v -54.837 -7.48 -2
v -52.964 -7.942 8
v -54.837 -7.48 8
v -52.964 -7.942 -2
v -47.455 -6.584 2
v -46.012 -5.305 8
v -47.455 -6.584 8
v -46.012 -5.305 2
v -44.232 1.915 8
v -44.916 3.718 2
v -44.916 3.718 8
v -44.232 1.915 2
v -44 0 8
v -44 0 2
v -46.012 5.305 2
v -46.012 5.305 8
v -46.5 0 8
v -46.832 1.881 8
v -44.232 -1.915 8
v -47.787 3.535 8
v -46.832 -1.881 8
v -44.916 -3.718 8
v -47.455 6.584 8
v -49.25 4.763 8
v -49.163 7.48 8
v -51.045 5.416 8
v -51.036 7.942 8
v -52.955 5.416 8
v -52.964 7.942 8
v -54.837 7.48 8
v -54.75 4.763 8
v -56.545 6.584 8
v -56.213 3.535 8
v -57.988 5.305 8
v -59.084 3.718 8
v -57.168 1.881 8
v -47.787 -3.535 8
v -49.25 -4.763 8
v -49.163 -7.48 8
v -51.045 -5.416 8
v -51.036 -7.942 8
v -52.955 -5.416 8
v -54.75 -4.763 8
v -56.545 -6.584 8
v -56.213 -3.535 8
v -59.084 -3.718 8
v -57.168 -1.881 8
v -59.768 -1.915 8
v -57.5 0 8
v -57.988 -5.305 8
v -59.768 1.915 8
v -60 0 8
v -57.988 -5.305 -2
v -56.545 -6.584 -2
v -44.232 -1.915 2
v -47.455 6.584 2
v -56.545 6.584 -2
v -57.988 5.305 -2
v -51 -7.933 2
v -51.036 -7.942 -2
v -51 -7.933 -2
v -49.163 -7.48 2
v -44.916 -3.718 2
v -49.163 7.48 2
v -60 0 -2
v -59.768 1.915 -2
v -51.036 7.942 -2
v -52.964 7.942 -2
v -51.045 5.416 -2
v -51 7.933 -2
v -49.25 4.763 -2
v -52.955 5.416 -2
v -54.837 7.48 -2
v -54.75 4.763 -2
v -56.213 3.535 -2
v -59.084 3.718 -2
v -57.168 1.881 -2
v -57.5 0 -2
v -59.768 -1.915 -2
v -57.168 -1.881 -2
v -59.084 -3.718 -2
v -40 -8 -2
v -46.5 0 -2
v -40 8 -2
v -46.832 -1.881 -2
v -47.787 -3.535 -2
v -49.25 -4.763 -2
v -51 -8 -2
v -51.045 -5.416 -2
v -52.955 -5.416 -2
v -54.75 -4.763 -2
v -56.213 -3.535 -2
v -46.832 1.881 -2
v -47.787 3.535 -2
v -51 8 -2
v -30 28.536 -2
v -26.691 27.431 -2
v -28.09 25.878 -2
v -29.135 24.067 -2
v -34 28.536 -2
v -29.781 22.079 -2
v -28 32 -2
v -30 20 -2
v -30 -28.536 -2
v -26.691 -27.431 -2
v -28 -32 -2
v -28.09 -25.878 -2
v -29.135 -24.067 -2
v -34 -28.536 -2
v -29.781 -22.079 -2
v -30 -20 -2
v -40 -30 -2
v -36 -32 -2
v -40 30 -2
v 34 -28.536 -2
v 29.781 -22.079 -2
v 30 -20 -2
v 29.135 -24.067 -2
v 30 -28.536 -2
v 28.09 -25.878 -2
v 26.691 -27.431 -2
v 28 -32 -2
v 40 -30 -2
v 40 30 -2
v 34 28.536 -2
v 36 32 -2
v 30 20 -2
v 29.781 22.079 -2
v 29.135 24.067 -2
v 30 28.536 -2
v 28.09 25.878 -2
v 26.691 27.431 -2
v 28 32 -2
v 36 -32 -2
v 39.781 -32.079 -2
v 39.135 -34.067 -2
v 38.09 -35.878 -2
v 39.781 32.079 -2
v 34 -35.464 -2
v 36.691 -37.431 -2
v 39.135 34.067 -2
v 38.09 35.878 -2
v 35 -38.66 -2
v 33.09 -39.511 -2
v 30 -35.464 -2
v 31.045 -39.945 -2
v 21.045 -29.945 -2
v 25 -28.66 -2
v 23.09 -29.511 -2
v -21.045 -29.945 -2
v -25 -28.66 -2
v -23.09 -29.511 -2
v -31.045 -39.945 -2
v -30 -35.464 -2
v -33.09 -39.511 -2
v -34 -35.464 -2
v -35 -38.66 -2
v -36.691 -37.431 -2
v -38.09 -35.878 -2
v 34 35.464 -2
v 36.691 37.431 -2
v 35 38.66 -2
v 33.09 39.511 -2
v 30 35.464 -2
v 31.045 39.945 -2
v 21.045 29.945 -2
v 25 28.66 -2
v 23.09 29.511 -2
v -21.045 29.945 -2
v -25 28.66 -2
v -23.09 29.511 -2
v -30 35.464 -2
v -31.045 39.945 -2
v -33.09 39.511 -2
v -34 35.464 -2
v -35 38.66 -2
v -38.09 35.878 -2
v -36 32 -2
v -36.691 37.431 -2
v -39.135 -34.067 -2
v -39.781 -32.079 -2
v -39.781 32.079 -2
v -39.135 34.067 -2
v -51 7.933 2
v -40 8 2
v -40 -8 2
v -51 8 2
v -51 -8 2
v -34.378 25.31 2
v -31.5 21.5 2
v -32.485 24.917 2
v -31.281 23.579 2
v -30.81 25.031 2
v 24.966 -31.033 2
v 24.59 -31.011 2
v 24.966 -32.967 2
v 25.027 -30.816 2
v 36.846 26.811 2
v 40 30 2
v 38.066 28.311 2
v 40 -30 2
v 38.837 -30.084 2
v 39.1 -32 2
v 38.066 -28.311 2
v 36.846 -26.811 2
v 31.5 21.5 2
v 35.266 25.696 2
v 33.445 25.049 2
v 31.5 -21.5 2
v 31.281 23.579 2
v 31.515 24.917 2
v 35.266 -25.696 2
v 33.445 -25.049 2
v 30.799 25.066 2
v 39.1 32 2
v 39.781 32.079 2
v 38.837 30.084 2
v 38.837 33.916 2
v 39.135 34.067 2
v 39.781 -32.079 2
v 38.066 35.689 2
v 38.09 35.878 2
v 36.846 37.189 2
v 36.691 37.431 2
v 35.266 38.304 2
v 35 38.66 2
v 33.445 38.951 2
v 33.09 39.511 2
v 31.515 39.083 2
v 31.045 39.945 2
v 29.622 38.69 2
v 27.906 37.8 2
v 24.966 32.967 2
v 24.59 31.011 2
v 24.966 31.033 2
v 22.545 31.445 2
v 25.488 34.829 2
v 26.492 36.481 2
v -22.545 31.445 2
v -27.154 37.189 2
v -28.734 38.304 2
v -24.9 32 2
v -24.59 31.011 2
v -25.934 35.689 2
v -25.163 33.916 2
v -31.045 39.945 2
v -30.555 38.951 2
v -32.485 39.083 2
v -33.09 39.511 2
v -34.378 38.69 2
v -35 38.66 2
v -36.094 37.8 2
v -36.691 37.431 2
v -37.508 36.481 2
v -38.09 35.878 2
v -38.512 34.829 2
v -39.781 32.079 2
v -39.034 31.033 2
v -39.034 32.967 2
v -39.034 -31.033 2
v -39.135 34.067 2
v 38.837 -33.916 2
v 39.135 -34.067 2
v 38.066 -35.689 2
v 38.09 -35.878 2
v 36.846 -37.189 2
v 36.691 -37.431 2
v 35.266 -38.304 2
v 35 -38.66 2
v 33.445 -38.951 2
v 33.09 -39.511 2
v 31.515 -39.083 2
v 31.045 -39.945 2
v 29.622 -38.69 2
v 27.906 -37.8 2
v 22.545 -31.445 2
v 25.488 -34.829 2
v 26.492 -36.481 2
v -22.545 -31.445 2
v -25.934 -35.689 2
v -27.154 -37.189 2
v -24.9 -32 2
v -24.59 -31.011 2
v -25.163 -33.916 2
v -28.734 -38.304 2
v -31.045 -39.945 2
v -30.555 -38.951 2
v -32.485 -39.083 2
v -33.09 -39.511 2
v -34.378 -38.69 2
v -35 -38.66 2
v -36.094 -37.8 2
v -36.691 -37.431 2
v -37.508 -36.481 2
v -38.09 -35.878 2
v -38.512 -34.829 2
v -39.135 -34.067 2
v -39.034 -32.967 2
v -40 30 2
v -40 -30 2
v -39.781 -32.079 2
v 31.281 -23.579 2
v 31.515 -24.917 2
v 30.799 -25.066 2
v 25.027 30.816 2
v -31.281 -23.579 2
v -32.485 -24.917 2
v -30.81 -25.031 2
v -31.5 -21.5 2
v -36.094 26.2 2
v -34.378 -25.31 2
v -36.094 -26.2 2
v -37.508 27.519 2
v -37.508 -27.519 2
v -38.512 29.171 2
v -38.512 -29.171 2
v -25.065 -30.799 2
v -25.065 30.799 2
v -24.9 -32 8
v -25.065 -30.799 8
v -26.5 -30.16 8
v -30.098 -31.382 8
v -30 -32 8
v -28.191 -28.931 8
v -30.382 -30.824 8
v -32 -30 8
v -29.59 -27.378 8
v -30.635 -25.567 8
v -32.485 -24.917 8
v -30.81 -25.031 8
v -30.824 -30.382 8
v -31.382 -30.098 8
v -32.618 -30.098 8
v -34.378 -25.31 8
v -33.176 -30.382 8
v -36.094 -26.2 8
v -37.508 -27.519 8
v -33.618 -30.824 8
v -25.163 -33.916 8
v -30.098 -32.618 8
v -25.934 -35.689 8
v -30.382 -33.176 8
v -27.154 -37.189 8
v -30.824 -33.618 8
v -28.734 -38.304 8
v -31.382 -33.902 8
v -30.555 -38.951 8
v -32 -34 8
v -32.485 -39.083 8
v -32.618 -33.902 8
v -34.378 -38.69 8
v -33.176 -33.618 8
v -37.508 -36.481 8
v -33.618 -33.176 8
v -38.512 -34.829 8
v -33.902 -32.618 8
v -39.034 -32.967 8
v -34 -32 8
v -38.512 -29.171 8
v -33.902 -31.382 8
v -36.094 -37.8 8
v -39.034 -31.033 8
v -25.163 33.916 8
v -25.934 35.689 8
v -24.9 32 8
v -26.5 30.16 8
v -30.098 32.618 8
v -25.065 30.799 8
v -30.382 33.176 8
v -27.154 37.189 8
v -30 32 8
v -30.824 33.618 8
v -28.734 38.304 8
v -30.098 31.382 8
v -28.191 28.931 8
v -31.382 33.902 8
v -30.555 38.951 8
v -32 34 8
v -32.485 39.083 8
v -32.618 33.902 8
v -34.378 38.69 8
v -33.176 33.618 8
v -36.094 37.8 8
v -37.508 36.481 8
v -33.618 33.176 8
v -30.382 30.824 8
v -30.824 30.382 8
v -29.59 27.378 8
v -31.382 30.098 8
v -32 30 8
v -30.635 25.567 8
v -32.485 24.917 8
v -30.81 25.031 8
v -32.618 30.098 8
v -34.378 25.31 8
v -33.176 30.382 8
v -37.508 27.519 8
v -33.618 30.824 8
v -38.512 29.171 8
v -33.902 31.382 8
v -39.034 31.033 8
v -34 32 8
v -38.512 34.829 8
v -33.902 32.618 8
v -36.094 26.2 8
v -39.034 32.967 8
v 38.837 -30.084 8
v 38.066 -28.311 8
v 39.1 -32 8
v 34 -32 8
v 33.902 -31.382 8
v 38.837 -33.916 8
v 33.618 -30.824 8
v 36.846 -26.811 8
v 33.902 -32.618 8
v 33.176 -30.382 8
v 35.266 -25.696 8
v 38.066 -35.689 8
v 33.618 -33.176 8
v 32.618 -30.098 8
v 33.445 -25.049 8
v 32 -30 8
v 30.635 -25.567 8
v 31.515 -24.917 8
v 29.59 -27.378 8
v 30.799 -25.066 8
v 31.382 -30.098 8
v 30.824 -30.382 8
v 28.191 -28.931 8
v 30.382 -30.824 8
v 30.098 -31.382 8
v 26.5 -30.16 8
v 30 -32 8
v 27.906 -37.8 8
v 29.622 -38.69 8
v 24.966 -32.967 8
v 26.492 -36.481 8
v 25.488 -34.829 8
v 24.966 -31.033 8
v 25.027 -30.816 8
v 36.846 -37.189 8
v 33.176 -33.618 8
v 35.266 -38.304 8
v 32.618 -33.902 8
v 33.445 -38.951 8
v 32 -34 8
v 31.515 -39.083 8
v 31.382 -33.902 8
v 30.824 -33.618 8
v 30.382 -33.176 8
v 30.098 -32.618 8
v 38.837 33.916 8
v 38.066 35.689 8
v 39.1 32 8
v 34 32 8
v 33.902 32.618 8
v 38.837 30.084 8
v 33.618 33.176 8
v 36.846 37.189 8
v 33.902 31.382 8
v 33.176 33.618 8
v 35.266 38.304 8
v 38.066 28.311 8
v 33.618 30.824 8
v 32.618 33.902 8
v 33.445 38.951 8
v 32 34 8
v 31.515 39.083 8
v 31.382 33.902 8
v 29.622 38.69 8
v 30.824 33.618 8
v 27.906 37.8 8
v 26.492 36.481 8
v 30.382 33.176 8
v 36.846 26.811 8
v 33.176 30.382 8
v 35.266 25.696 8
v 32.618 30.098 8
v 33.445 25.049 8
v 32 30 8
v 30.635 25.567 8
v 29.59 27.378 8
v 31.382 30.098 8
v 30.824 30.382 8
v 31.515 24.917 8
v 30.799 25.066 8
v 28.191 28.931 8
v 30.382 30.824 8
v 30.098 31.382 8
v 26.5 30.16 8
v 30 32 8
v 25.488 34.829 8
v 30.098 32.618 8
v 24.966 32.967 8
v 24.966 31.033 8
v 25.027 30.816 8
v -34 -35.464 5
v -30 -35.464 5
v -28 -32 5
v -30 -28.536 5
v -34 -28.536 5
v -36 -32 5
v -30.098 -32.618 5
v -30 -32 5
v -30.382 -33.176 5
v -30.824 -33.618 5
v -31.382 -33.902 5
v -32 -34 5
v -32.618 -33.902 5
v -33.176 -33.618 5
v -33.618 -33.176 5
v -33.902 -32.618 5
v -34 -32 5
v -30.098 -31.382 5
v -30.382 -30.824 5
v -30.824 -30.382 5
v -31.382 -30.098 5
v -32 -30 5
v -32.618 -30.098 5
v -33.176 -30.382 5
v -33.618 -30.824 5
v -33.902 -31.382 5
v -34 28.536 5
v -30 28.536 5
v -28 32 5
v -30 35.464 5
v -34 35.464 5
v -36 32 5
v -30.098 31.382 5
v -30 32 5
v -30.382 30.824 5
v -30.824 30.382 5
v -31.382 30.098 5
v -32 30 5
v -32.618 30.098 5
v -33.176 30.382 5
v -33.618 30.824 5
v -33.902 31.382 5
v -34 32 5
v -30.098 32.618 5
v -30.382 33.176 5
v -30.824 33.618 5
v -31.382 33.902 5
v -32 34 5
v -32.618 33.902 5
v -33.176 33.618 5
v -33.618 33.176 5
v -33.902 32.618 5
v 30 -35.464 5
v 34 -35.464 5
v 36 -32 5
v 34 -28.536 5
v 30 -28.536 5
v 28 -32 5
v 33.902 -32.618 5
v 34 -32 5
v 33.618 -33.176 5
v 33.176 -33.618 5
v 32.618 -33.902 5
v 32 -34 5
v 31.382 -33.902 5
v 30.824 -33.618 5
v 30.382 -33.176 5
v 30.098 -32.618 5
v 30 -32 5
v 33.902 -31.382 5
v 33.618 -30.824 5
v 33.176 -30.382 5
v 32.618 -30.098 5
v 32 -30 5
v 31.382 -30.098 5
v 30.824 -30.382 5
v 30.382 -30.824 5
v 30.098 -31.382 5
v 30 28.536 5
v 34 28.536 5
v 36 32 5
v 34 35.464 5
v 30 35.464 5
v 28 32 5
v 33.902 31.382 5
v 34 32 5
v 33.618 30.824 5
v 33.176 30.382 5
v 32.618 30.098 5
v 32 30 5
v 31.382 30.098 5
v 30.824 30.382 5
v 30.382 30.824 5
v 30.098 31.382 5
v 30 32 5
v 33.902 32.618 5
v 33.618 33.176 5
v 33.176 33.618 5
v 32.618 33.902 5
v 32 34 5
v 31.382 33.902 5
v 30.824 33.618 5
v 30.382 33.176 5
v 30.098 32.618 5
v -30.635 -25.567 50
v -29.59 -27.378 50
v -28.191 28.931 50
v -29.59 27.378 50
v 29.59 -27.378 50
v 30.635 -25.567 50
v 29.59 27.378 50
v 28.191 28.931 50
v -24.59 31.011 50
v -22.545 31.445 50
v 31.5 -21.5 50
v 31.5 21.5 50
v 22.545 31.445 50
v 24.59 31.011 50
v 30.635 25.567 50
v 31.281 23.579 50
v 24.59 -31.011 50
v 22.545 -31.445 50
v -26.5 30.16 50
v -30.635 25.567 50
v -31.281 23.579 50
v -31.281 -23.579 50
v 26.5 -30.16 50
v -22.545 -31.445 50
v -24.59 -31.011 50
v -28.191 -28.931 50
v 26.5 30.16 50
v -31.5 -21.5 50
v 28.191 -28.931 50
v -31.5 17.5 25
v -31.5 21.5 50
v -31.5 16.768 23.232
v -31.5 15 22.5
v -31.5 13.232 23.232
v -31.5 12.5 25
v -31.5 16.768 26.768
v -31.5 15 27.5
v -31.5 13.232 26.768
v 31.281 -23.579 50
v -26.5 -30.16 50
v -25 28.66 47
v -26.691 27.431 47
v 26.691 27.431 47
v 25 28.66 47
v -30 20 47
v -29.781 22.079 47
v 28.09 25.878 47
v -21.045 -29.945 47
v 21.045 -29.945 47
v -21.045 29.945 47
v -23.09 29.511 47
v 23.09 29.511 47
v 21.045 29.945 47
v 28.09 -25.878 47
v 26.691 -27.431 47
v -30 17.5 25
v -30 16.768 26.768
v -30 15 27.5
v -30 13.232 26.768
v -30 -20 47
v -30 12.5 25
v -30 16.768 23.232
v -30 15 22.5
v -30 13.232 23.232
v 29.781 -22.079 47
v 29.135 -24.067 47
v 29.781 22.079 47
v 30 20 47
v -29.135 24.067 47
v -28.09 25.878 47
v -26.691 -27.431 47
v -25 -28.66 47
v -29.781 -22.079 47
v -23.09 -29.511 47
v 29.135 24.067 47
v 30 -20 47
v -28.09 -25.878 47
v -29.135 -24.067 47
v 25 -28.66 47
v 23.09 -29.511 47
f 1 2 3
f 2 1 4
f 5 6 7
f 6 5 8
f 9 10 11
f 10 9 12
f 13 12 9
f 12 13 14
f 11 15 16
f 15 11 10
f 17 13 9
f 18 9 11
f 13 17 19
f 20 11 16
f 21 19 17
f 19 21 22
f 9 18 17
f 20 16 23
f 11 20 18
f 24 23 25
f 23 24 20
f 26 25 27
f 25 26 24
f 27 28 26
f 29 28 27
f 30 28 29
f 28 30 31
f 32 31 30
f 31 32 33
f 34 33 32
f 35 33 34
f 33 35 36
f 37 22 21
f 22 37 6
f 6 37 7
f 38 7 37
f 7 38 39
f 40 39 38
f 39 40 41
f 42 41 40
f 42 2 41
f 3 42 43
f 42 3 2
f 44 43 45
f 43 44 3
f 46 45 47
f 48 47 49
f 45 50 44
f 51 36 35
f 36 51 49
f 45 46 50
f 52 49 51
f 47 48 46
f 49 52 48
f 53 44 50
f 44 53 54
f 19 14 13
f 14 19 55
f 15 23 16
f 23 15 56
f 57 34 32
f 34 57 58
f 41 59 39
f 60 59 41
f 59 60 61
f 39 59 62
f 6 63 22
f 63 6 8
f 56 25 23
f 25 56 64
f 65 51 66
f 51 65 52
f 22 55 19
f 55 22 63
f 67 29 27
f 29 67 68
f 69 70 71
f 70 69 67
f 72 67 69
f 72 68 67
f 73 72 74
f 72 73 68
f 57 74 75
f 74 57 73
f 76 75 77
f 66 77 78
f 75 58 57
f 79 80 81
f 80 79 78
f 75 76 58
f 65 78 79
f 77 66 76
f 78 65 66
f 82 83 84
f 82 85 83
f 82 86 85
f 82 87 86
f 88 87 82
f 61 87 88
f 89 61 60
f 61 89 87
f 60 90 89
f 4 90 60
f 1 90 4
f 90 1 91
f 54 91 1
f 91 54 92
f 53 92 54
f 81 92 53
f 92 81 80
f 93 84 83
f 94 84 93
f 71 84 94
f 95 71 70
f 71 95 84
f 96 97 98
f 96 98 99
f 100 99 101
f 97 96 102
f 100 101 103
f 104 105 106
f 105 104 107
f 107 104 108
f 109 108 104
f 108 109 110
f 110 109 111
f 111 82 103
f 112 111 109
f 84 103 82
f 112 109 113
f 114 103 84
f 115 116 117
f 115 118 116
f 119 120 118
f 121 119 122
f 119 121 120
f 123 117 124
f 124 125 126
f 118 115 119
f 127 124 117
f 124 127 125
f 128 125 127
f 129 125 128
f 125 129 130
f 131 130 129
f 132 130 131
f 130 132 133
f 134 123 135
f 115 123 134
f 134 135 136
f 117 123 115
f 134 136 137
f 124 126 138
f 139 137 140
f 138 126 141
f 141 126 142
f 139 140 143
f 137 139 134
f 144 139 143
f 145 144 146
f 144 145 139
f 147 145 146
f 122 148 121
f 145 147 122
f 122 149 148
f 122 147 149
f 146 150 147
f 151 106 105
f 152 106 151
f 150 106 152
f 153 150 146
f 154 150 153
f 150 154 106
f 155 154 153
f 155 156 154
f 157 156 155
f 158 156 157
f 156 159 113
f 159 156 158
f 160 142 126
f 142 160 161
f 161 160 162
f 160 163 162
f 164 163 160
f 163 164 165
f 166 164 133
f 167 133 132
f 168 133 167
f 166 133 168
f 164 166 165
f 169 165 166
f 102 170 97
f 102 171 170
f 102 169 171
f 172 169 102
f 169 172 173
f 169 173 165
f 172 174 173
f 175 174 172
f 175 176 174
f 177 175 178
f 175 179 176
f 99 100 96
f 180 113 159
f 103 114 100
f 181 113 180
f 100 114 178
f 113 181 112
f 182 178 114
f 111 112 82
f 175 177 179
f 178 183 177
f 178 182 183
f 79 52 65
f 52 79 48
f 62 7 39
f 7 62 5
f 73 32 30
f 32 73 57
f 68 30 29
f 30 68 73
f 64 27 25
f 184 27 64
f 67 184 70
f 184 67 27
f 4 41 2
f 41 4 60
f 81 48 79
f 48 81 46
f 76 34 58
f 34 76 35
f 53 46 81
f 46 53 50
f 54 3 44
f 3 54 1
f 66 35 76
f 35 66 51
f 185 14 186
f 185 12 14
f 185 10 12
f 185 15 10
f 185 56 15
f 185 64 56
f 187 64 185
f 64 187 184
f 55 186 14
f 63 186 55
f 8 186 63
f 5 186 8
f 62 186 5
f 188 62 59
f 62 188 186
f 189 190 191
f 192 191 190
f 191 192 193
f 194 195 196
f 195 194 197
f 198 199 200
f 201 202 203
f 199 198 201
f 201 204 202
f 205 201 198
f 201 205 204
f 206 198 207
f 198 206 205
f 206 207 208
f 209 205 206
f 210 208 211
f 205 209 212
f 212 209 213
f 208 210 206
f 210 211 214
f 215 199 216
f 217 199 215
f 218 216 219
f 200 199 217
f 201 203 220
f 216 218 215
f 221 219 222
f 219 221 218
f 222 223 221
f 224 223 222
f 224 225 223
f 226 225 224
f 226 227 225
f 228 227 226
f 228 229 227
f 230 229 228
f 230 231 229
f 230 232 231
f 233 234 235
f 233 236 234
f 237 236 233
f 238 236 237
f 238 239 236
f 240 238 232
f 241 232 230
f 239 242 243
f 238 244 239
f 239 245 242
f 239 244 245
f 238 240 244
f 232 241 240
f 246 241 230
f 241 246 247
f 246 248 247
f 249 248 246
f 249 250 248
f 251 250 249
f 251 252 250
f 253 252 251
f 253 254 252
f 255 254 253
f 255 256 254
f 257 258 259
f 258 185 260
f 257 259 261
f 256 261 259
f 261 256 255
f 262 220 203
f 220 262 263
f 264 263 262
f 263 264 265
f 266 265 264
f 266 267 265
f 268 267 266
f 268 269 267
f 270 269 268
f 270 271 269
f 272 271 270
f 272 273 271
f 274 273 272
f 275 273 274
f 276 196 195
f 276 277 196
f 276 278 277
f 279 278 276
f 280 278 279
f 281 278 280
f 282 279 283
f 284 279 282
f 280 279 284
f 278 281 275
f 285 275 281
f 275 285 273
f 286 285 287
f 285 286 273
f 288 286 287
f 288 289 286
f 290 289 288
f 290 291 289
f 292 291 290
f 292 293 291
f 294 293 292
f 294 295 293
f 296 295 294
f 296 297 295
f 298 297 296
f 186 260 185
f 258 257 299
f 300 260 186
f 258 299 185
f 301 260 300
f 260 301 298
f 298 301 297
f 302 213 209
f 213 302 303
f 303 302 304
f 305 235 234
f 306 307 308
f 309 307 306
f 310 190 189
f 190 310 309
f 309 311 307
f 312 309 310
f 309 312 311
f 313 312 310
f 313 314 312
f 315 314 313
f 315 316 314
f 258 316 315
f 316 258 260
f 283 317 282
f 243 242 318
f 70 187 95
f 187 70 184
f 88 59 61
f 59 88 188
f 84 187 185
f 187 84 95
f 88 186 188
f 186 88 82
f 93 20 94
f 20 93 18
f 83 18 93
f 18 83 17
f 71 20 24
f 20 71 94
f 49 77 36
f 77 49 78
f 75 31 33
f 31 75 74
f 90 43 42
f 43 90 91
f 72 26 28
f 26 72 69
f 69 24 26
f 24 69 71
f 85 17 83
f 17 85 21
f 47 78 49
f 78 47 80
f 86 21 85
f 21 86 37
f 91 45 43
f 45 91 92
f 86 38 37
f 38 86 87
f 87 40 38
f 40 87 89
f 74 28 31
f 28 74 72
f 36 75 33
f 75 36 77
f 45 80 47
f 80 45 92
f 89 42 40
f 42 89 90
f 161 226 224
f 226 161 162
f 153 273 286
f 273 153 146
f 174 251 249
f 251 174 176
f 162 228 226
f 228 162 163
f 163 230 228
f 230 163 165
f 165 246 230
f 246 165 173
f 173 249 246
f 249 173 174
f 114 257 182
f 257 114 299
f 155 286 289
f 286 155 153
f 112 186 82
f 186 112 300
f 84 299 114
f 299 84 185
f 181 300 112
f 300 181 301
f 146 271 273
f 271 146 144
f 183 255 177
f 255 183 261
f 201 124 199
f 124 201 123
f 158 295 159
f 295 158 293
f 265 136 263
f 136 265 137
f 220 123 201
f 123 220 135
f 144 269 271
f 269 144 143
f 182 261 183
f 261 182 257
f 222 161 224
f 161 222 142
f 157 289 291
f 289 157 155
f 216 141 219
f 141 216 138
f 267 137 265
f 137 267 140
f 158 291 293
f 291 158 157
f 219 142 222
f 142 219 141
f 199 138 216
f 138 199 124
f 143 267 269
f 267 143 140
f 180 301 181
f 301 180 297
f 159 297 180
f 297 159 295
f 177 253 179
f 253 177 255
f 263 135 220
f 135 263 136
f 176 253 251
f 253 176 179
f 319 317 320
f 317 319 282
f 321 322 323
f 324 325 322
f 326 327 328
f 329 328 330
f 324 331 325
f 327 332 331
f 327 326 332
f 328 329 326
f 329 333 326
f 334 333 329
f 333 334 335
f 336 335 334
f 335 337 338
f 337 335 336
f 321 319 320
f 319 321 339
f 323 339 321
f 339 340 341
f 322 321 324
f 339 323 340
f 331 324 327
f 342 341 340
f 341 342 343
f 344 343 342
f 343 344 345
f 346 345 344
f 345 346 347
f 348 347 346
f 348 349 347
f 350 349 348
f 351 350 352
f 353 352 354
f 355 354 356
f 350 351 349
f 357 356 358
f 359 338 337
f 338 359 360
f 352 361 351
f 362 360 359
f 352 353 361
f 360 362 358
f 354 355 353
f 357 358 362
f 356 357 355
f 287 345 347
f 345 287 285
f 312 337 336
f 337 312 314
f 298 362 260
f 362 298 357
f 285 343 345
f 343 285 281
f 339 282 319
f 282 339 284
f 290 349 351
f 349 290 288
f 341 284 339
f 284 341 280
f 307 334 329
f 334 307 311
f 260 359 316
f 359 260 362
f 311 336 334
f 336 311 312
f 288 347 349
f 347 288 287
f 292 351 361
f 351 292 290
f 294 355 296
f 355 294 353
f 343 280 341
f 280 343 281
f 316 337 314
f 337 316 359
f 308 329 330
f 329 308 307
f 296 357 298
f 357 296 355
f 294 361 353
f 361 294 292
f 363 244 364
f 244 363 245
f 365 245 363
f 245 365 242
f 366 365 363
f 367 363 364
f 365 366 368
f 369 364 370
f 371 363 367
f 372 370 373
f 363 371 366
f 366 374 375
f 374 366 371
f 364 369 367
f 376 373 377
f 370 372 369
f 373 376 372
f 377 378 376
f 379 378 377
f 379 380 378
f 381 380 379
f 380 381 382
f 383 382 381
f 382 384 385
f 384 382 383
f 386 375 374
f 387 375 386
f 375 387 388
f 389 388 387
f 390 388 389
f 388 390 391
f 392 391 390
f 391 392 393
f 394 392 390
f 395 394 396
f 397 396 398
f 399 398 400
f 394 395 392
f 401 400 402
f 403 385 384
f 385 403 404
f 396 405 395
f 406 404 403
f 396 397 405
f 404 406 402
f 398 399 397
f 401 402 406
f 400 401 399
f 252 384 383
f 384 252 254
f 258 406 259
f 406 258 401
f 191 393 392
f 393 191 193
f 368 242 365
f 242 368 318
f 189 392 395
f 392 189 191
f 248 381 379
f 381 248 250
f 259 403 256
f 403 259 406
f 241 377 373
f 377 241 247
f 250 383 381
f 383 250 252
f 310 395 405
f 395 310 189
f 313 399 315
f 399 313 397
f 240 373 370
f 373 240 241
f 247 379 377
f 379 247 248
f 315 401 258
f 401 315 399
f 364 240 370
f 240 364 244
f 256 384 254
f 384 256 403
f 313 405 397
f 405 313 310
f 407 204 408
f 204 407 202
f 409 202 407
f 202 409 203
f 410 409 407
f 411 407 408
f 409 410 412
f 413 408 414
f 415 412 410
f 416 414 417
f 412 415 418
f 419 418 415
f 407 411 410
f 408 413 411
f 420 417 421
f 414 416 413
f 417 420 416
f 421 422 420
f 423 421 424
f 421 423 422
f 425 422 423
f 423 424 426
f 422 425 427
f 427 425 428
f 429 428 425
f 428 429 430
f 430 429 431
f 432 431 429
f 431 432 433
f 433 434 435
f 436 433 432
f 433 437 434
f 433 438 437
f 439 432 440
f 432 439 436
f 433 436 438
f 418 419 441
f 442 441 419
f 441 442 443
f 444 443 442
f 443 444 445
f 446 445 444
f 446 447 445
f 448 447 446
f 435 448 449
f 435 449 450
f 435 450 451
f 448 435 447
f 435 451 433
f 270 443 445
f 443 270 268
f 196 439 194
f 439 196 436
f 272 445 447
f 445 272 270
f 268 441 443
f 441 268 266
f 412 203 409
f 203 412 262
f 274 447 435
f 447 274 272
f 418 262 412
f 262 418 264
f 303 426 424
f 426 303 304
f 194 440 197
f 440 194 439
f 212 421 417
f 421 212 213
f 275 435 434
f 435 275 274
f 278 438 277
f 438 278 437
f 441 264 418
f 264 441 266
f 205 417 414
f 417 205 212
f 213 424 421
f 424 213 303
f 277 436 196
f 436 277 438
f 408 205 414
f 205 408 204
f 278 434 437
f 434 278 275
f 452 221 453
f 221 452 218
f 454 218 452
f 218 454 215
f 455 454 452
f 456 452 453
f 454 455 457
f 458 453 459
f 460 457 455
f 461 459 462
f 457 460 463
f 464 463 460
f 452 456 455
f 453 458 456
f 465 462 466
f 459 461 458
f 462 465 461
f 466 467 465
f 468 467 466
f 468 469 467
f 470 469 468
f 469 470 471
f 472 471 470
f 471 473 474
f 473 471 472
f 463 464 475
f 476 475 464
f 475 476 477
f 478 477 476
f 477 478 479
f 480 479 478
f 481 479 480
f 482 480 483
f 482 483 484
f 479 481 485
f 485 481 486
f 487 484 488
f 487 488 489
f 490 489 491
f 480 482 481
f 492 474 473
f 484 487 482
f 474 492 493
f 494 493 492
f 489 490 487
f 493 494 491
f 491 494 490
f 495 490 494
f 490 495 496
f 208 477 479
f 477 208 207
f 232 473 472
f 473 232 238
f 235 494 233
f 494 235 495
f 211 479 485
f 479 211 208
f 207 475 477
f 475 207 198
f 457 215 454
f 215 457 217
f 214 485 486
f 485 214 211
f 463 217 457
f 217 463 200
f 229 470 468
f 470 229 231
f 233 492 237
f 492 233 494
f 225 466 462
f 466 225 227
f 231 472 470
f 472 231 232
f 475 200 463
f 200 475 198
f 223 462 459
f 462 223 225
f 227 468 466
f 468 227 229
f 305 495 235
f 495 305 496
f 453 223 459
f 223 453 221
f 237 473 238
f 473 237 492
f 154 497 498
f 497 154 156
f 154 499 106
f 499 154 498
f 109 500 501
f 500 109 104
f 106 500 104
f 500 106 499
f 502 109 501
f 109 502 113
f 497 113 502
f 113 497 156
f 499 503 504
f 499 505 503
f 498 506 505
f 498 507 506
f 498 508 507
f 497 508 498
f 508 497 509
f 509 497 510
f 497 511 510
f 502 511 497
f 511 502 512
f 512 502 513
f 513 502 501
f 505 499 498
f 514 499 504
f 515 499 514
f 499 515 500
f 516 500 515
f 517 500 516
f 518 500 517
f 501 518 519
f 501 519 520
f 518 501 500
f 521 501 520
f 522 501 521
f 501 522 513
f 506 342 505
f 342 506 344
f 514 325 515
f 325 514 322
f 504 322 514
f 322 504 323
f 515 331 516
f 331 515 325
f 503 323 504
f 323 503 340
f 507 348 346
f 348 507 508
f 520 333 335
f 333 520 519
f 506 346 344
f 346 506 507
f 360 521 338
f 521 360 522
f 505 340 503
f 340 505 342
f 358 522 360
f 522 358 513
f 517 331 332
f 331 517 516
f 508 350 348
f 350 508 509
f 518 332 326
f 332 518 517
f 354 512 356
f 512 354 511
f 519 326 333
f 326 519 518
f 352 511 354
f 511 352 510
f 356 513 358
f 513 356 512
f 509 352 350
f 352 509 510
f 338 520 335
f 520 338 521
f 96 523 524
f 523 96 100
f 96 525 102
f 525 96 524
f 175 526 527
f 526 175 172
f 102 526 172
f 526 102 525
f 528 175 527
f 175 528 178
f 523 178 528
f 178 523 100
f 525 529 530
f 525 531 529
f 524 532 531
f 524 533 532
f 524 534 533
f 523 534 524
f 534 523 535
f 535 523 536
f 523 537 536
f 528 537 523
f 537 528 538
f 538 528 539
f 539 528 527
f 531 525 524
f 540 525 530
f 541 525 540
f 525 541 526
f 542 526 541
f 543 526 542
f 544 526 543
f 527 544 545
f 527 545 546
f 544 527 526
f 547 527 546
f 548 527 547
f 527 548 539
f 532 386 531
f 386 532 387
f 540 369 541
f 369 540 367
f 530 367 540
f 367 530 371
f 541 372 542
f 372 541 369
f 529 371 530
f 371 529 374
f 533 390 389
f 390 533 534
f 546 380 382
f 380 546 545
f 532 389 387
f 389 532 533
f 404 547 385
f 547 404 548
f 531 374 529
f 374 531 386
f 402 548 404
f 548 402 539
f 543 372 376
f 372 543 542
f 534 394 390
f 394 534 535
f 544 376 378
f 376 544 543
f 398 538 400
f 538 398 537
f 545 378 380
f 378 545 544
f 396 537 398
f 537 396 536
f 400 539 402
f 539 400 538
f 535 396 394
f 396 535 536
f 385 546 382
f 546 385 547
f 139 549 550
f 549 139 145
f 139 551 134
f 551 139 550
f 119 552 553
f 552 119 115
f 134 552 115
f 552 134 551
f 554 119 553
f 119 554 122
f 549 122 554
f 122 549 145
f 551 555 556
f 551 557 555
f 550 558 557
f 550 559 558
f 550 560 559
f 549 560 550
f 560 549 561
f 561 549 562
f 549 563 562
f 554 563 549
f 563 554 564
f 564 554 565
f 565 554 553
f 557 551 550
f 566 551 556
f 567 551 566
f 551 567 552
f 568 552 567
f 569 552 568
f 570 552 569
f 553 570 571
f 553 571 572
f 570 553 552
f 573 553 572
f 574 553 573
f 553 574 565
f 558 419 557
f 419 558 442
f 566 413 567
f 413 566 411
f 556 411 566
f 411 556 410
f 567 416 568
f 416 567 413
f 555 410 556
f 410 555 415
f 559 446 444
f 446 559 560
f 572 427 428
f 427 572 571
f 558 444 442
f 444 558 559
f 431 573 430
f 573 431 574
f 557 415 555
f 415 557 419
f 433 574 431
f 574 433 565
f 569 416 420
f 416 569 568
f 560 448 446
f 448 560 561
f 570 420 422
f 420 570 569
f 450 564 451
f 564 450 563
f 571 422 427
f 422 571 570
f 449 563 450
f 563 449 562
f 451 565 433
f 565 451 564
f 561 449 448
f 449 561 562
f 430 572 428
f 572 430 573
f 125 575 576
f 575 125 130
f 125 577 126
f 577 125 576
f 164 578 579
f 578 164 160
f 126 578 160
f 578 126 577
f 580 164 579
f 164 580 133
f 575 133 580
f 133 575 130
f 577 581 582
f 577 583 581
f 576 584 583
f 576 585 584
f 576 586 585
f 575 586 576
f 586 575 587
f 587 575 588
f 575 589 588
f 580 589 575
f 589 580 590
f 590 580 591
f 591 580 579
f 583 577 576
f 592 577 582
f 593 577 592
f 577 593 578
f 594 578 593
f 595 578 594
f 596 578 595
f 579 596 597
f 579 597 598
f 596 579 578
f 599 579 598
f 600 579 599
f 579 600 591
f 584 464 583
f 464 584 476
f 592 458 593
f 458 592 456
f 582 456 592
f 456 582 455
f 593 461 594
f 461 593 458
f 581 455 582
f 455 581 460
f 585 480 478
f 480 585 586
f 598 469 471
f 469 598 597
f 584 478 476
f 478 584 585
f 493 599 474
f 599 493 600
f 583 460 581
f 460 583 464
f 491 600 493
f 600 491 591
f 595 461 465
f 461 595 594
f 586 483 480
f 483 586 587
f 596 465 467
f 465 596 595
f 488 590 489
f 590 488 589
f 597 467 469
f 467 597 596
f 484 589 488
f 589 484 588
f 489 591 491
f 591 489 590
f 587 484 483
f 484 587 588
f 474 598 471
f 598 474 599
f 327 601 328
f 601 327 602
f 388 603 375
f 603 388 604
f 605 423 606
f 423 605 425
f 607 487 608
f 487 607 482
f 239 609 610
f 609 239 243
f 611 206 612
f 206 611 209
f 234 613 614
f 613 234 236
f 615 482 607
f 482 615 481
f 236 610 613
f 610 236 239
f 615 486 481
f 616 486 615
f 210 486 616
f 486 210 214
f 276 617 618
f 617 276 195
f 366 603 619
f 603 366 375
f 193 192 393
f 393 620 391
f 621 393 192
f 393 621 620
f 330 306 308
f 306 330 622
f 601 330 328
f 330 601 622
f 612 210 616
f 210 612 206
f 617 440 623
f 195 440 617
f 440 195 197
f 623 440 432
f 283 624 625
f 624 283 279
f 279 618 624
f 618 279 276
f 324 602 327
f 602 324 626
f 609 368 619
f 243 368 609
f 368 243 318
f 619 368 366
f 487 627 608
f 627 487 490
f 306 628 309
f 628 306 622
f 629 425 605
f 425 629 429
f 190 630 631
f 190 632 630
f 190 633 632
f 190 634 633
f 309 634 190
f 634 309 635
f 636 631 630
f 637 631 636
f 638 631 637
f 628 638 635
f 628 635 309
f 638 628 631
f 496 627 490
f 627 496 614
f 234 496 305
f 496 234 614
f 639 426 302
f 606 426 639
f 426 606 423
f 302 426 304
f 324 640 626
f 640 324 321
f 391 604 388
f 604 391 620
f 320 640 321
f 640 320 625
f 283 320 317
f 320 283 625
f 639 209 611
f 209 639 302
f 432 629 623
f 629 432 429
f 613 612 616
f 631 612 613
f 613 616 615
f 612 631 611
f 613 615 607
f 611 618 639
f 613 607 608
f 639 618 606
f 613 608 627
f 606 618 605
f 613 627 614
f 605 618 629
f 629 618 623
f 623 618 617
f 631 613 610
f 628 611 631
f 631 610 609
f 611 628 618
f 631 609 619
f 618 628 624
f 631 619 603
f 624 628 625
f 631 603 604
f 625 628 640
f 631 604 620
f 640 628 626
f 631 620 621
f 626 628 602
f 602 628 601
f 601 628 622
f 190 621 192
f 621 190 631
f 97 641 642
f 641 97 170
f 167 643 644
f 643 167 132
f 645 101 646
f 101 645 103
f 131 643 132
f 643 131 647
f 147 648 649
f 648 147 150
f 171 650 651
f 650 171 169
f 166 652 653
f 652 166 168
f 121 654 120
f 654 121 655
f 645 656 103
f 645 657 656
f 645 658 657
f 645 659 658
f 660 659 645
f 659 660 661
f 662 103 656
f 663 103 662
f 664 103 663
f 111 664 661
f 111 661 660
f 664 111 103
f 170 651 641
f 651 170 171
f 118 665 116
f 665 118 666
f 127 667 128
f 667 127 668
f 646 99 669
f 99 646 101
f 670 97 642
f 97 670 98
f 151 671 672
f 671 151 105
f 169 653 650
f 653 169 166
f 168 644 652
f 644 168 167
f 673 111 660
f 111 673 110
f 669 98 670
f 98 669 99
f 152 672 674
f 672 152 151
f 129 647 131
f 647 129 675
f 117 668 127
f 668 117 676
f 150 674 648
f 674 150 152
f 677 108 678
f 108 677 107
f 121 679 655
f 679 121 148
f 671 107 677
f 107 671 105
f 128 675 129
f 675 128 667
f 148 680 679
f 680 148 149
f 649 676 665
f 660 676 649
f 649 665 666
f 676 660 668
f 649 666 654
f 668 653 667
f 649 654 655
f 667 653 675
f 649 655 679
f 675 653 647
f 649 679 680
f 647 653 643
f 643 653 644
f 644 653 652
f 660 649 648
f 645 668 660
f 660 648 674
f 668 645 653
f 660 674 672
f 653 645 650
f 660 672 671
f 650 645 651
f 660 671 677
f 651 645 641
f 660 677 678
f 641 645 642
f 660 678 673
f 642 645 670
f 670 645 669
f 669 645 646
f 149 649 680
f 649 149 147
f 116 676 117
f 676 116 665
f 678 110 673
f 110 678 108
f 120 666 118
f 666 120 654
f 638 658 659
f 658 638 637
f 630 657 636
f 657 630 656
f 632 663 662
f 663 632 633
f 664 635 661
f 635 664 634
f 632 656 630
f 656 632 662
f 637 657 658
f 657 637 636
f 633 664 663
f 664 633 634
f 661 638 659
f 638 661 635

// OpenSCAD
module box(x, y, z)
{
	minkowski() {
		cube([x - 20, y - 20, z], center = true);
		cylinder(r = 10, h = z, center = true);
	}
}

module m4_nut_trap()
{
	union() {
		translate([0, 0, -2]) cylinder(r = 4, h = 8, $fn = 6, center = true);
		cylinder(r = 2, h = 20, center = true, $fn = 20);
	}
}

module rudder_shaft()
{
	difference() {
		union() {
			cylinder(r = 8, h = 10, center = true);
			translate([7, 0, -3]) cube([12, 16, 4], center = true);
		}
		cylinder(r = 11/2, h = 20, center = true);
	}
}

module stepper_base()
{
	difference() {
		union() {
			box(80, 80, 2);
			translate([-32, -32, 3]) cylinder(r = 7.1, h = 10, center = true);
			translate([-32, 32, 3]) cylinder(r = 7.1, h = 10, center = true);
			translate([32, -32, 3]) cylinder(r = 7.1, h = 10, center = true);
			translate([32, 32, 3]) cylinder(r = 7.1, h = 10, center = true);
			translate([-52, 0, 3]) rudder_shaft();
		}
		translate([-32, -32, 3]) m4_nut_trap();
		translate([-32, 32, 3]) m4_nut_trap();
		translate([32, -32, 3]) m4_nut_trap();
		translate([32, 32, 3]) m4_nut_trap();
	}
}

module rudder_stepper_box()
{
	difference() {
		union() {
			translate([0, 0, 25]) box(63, 63, 25);
			stepper_base();
		}
		translate([0, 0, 22]) box(60, 60, 25);
		translate([-30, 15, 25]) rotate(a = [0, 90, 0])
				cylinder(r = 2.5, h = 10, center = true);
	}
}

module sail_stepper_box()
{
	difference() {
		union() {
			translate([0, 0, 25]) box(63, 63, 25);
			stepper_base();
		}
		translate([0, 0, 22]) box(60, 60, 25);
		translate([-30, 0, 25]) rotate(a = [0, 90, 0])
				cylinder(r = 2.5, h = 10, center = true);
	}
}

rudder_stepper_box();
